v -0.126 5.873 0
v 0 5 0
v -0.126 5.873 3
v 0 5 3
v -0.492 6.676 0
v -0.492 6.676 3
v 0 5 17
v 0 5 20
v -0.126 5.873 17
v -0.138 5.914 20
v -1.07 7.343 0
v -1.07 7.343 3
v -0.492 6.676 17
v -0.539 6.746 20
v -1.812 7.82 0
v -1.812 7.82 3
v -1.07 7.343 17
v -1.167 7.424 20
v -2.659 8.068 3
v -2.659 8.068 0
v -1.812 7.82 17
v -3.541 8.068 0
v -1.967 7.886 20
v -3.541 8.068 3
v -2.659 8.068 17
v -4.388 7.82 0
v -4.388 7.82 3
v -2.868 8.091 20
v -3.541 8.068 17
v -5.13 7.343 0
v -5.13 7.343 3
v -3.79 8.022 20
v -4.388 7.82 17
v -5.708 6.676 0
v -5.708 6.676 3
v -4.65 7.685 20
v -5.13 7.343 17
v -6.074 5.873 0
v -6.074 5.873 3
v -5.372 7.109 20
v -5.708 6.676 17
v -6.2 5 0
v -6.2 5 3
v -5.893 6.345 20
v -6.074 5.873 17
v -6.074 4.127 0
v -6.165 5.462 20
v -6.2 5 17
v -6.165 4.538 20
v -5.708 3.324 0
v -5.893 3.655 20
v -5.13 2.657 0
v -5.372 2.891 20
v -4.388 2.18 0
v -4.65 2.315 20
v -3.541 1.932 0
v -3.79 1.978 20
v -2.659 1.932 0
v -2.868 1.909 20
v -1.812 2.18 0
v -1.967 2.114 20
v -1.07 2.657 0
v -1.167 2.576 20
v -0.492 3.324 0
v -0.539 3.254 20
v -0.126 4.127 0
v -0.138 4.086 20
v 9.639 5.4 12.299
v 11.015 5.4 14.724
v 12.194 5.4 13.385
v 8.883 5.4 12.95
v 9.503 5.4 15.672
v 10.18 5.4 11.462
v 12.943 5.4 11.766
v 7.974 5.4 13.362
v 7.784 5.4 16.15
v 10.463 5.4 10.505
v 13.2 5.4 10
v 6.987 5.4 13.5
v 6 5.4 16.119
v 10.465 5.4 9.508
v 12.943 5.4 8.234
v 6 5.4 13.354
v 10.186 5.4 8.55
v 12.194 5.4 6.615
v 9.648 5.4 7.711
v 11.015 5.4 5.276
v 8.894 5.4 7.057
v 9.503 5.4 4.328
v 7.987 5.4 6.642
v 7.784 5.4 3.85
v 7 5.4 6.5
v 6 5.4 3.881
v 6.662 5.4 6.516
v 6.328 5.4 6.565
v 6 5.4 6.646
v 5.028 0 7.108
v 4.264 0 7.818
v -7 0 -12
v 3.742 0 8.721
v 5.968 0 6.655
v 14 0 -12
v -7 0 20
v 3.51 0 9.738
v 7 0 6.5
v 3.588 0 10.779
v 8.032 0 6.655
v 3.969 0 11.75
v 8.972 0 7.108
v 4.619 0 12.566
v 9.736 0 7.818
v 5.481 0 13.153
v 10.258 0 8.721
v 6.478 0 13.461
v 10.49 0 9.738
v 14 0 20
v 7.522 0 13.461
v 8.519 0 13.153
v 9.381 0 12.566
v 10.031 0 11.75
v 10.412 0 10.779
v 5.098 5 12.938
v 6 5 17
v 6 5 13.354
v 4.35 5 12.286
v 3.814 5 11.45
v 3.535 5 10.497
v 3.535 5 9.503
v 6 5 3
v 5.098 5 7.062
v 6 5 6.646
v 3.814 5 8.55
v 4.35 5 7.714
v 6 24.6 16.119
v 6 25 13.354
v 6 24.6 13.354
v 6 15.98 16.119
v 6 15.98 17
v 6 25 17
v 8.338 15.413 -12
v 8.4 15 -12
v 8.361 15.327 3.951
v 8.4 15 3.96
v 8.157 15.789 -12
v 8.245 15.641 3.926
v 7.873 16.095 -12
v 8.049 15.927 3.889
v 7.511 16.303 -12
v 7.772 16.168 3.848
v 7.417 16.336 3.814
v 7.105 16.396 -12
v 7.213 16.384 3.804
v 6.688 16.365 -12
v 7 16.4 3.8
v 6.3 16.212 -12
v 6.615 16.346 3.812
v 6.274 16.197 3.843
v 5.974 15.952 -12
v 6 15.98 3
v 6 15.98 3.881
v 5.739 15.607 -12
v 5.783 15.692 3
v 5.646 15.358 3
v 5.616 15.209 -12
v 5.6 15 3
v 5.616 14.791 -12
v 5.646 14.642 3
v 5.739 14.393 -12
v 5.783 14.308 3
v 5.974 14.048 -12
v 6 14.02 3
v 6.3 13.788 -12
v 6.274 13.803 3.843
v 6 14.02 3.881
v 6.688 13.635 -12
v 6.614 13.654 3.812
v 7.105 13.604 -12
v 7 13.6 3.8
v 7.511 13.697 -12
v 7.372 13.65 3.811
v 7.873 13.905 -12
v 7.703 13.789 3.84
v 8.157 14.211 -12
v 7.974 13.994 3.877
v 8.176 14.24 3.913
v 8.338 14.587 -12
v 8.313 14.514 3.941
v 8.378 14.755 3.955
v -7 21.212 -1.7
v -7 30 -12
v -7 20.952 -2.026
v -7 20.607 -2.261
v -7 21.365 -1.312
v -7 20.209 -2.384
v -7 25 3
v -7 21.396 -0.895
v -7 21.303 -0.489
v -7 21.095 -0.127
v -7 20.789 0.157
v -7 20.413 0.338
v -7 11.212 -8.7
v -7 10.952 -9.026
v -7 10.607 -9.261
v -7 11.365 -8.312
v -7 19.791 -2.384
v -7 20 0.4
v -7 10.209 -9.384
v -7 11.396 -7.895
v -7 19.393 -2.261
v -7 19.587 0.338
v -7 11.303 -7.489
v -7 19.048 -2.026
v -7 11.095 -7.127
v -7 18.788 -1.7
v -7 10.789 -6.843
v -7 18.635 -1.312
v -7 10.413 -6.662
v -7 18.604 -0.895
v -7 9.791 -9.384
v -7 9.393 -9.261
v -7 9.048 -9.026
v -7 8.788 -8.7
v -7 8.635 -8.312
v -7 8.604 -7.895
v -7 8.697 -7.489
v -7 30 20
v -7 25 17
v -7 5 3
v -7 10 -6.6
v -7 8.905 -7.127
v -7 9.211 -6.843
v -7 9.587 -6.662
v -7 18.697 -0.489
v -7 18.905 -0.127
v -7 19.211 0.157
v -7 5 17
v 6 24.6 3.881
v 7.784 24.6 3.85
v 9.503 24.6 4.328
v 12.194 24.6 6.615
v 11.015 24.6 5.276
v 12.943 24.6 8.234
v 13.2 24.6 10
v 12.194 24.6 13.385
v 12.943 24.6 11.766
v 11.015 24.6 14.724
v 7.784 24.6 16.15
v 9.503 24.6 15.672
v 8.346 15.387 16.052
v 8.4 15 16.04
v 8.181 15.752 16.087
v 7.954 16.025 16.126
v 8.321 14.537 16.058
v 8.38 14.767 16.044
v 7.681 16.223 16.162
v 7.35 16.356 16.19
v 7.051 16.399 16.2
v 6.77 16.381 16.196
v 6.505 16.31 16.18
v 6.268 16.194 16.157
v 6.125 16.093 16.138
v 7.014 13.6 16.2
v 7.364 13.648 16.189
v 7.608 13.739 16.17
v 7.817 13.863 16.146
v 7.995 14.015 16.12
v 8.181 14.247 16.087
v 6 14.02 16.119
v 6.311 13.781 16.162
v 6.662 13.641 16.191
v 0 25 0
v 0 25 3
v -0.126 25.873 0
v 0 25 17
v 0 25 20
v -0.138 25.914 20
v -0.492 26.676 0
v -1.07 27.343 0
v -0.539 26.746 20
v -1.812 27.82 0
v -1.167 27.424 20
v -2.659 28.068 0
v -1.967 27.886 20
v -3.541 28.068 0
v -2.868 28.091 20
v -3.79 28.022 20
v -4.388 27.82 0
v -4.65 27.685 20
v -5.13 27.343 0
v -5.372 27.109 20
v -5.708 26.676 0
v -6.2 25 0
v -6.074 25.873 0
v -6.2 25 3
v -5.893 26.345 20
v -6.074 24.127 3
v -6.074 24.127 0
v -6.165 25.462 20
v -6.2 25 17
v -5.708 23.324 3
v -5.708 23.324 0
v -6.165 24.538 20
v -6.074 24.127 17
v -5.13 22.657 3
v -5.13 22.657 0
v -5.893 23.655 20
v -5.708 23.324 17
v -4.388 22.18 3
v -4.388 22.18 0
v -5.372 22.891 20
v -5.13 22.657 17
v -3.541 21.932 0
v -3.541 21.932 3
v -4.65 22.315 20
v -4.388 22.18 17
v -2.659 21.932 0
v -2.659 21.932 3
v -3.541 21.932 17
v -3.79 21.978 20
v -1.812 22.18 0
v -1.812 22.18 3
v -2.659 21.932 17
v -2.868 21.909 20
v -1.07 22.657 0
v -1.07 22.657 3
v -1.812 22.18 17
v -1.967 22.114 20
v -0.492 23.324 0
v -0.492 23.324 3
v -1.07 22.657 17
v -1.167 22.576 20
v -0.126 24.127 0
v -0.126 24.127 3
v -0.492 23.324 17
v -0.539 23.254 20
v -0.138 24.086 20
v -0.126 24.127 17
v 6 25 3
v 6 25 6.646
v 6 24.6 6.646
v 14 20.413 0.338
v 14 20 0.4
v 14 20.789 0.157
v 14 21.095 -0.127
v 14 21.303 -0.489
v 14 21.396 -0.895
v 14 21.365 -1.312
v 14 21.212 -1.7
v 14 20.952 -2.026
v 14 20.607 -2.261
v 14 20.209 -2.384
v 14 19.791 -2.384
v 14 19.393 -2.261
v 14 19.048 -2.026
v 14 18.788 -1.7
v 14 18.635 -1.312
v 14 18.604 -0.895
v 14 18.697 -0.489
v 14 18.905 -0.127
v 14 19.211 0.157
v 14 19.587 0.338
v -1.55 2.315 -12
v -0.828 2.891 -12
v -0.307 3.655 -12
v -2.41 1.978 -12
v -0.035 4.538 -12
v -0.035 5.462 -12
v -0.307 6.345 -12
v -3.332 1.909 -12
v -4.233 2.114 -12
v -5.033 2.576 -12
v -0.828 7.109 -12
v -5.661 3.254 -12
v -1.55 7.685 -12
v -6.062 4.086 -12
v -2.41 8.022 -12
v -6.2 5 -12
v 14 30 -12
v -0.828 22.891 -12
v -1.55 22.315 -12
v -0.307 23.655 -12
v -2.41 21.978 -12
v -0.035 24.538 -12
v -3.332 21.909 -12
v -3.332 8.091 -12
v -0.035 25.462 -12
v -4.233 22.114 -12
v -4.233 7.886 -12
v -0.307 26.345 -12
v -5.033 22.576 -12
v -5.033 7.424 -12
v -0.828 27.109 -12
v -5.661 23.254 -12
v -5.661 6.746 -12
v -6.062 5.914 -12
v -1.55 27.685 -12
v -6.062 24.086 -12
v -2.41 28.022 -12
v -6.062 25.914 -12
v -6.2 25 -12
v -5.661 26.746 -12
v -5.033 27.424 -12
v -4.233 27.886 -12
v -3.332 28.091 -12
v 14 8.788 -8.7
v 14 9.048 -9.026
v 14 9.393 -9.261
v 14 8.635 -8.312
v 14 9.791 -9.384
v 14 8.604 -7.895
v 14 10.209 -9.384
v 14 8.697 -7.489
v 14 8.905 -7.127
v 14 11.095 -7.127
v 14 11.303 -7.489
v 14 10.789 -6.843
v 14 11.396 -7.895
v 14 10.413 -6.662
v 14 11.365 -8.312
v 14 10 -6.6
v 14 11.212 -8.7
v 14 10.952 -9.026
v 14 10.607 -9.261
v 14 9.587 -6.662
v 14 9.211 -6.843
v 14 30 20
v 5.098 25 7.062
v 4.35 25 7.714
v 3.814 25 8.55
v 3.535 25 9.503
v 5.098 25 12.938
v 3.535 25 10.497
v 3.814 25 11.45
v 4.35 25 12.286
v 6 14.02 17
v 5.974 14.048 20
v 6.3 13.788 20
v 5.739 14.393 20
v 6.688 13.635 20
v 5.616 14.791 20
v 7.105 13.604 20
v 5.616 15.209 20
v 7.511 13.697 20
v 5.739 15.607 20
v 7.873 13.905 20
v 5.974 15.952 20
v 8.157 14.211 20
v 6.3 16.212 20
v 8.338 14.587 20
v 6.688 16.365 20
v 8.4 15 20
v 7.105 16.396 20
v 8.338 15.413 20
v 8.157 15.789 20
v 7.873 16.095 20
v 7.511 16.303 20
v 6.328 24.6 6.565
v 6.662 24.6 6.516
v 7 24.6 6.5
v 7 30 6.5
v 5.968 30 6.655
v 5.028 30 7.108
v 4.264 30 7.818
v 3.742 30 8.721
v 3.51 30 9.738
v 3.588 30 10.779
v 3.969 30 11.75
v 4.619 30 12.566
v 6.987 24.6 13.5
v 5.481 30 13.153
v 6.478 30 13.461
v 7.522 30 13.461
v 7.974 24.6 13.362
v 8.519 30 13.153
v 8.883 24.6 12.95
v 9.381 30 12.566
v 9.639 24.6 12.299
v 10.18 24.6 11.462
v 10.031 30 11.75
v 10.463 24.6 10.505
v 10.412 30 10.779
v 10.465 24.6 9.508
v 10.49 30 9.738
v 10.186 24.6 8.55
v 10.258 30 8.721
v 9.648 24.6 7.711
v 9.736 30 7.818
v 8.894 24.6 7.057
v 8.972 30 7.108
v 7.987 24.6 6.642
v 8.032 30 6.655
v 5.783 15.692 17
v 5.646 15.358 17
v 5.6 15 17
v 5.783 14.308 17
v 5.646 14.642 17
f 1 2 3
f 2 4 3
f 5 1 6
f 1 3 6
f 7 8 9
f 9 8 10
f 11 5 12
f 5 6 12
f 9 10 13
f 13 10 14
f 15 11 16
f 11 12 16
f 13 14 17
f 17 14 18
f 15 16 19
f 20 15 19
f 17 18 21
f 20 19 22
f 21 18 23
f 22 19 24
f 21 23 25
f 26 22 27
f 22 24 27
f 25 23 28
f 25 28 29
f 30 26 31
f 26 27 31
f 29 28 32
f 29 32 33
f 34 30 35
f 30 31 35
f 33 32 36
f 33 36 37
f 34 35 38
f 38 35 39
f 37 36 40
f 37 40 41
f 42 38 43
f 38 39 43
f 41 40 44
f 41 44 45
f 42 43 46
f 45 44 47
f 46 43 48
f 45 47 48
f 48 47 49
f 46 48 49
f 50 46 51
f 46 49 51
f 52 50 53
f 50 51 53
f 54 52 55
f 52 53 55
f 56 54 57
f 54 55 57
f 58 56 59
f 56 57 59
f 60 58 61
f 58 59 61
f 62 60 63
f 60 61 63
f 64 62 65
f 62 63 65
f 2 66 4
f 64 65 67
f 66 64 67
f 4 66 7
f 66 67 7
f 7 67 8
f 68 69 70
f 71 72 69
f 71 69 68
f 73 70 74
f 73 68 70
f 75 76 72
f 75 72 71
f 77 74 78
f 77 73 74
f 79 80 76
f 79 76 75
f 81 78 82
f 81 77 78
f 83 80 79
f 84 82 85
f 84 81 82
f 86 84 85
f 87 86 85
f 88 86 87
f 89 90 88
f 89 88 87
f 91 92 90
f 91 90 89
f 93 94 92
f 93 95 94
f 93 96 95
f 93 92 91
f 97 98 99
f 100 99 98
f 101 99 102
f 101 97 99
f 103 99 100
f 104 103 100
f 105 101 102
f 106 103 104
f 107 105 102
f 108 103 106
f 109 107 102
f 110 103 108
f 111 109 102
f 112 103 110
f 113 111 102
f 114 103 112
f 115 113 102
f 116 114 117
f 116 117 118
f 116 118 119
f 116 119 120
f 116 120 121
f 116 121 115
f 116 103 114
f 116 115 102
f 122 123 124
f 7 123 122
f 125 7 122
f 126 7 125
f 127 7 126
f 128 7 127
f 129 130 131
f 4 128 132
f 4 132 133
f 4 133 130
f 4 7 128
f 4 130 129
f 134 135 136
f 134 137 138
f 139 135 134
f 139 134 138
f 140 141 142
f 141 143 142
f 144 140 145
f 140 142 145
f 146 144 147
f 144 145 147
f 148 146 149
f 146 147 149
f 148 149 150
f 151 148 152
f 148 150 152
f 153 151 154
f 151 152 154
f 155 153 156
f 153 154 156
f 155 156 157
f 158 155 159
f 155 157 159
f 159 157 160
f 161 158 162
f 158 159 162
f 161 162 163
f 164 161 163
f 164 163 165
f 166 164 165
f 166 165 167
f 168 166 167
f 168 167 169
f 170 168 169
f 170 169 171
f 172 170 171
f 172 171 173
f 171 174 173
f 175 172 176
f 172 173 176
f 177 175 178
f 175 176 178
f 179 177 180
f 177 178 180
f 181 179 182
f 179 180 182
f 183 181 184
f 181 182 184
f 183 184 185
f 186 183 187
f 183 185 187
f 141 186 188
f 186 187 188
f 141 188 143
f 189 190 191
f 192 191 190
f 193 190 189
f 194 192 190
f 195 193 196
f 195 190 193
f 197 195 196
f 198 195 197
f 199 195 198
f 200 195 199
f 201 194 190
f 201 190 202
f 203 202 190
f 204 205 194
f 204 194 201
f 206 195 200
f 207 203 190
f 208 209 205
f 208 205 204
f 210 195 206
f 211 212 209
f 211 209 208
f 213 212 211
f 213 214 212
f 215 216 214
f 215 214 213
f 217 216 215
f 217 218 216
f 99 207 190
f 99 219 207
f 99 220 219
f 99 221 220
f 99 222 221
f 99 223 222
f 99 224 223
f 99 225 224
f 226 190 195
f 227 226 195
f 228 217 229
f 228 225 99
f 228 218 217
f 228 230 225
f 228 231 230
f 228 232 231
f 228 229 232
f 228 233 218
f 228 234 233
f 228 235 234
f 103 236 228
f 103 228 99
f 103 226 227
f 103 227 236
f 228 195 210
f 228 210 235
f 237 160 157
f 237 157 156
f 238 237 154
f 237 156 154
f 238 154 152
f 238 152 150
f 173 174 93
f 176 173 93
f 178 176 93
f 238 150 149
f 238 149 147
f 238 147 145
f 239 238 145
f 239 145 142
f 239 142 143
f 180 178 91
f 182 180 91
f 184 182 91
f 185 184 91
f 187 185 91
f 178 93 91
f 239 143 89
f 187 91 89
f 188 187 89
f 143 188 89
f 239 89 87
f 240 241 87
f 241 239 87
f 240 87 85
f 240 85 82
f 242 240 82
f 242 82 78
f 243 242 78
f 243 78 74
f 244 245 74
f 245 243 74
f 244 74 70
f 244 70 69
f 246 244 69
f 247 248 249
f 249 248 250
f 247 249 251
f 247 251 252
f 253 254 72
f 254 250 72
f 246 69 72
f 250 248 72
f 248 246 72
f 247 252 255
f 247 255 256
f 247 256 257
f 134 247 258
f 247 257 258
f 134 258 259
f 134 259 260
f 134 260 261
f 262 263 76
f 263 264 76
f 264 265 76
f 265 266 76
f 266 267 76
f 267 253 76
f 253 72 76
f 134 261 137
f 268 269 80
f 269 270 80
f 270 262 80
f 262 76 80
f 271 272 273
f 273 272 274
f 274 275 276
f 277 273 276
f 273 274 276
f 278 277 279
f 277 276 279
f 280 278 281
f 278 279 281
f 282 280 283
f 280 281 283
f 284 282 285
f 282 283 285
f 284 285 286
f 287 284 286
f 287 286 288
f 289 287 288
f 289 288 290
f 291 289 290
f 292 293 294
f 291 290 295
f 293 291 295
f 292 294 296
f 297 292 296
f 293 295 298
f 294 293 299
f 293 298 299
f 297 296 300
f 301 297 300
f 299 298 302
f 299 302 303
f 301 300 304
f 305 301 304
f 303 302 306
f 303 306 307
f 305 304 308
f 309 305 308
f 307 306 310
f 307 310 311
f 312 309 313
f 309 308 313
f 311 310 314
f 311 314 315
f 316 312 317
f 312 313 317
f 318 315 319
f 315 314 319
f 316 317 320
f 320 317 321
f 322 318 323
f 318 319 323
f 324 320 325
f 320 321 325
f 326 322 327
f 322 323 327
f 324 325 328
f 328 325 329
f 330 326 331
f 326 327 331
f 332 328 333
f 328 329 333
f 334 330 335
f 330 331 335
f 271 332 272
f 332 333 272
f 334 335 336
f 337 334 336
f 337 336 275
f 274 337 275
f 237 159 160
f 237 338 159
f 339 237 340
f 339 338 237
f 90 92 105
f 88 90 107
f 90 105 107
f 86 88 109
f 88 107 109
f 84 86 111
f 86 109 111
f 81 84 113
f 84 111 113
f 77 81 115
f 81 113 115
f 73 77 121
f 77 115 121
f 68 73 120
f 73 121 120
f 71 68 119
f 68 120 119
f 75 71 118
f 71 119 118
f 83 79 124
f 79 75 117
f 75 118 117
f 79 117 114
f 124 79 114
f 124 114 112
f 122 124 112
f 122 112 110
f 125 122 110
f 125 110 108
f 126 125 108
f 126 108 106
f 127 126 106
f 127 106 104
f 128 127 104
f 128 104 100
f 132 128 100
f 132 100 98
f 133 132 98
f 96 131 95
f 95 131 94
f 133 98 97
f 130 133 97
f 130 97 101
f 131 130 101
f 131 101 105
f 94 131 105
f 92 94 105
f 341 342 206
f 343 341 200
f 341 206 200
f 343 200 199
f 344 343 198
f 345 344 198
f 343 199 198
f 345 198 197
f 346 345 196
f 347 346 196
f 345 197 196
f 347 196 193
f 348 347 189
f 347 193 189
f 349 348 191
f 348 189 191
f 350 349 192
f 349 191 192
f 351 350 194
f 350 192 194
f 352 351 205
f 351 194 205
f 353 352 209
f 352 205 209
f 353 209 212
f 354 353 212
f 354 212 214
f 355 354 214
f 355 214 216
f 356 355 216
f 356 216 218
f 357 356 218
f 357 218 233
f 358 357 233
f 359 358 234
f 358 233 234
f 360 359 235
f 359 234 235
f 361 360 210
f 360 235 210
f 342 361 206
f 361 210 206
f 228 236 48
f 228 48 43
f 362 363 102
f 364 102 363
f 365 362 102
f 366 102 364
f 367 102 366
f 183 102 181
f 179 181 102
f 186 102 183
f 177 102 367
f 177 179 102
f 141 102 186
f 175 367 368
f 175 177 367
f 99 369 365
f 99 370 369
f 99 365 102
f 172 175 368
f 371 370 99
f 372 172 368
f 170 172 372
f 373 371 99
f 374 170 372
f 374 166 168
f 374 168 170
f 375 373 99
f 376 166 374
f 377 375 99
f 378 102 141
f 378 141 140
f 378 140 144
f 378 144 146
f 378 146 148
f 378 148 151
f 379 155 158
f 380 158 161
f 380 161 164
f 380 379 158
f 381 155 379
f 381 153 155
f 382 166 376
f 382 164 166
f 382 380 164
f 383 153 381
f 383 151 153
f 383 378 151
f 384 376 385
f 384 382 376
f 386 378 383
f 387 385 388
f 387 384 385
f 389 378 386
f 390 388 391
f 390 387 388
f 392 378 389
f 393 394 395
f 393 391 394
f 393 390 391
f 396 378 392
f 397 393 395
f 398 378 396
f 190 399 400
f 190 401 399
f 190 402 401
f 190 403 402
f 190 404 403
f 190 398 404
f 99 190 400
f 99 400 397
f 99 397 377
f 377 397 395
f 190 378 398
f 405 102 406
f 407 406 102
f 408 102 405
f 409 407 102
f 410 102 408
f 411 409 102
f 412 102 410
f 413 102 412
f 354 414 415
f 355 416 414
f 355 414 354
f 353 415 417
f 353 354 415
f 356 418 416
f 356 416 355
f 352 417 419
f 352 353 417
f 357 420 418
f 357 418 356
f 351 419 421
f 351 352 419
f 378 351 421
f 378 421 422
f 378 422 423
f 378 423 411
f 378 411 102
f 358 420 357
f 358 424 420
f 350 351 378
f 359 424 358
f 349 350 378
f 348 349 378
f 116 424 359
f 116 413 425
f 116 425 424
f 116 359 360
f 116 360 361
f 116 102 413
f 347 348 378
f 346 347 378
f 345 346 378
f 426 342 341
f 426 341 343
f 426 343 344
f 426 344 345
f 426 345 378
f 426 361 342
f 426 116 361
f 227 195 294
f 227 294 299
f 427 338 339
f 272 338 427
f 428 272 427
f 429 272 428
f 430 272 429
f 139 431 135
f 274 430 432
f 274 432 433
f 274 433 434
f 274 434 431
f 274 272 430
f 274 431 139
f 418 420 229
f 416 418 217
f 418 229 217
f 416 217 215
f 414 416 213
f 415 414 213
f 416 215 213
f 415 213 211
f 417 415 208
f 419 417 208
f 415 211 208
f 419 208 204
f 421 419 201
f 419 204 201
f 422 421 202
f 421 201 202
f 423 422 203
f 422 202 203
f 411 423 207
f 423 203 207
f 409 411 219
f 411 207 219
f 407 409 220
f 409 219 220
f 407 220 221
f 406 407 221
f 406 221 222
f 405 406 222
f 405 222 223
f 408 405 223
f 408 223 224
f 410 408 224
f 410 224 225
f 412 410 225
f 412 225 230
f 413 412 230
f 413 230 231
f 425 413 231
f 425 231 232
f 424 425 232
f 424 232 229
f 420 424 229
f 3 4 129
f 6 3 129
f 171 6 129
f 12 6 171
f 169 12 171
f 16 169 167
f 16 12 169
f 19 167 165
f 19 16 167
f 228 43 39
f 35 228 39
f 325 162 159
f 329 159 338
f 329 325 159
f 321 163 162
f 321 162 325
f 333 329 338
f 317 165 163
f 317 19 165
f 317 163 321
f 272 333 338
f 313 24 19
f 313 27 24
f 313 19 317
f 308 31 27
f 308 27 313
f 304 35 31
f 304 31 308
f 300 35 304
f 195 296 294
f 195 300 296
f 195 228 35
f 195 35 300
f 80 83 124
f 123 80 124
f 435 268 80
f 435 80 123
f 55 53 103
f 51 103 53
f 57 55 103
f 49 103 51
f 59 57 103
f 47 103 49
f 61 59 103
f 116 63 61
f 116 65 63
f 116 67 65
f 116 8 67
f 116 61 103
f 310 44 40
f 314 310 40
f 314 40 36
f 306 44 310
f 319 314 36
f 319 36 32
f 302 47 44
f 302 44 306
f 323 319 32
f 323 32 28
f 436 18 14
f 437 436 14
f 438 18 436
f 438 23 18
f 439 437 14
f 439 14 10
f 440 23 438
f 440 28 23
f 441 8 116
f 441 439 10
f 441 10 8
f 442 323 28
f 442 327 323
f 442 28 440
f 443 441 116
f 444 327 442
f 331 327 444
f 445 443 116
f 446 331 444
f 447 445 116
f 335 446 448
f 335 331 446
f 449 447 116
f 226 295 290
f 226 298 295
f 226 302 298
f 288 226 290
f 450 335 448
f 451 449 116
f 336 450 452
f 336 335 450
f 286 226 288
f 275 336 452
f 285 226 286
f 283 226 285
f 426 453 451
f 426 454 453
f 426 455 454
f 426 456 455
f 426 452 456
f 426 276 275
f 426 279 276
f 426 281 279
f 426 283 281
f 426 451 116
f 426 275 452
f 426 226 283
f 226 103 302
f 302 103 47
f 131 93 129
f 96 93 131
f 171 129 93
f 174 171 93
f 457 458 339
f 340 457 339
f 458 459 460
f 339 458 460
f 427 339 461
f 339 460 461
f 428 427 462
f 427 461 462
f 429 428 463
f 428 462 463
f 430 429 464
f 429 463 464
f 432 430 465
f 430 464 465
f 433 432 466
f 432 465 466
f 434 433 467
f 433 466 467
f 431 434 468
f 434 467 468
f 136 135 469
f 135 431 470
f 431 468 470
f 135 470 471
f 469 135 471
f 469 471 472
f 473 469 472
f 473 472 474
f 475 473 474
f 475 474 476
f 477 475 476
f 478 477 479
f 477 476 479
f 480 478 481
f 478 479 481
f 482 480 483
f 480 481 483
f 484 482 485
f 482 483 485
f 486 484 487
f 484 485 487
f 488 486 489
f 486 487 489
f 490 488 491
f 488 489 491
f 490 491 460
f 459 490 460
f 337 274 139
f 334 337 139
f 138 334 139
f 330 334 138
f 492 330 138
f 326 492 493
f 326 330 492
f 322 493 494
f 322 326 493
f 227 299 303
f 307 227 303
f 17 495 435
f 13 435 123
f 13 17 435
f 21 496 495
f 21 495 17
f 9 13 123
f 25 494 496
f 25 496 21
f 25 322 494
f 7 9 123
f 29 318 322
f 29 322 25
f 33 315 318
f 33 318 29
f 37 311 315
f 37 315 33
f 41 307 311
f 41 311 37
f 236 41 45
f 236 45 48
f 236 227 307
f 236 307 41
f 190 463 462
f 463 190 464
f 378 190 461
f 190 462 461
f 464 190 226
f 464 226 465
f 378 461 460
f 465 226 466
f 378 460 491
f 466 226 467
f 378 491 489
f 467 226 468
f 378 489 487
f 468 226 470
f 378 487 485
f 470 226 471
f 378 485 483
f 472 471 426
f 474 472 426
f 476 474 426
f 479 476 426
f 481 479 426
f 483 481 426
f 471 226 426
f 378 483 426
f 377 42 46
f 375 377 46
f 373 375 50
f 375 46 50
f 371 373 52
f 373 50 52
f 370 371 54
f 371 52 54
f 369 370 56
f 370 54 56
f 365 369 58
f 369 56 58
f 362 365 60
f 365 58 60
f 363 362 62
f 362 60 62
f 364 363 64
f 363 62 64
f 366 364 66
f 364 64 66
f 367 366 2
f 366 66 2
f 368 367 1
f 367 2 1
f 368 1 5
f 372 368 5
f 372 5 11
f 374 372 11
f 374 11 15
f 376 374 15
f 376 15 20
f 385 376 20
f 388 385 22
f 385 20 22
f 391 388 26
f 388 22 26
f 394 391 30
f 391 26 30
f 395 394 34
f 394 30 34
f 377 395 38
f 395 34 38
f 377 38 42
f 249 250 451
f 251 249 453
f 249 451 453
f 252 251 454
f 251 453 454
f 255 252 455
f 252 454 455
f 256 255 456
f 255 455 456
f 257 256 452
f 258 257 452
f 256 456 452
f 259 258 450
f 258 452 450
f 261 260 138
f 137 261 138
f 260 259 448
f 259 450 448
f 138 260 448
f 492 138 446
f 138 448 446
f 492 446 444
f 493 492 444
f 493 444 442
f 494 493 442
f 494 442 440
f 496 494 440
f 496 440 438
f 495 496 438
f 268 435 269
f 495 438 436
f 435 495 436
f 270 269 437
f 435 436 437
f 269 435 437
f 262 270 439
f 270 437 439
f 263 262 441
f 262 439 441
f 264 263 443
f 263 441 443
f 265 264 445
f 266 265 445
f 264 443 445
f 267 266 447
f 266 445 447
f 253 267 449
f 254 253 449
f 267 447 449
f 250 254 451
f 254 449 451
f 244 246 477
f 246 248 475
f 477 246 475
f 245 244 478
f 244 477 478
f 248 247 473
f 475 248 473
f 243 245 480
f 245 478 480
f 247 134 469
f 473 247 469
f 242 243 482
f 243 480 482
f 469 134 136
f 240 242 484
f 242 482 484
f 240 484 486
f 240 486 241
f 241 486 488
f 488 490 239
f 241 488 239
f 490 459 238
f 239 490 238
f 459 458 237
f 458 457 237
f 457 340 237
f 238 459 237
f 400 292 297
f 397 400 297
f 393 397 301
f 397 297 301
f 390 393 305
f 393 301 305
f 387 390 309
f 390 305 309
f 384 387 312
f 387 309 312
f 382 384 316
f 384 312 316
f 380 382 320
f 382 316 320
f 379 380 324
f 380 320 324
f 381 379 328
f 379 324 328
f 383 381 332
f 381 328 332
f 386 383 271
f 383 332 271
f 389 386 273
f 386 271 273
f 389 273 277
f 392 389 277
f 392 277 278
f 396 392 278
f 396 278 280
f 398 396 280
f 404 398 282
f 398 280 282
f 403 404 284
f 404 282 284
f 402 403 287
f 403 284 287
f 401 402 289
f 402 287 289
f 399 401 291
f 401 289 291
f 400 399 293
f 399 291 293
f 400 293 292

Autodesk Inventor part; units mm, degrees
ref_plane "YZ Plane" through (0, 0, 0) normal (1, 0, 0) x (0, 1, 0)
ref_plane "XZ Plane" through (0, 0, 0) normal (0, 1, 0) x (-1, 0, 0)
sketch "Sketch1" plane through (0, 0, 0) normal (1, 0, 0) x (0, 1, 0)
  line L0 (0, 0) -> (30, 0)
  line L1 (30, 0) -> (30, 20)
  line L2 (30, 20) -> (0, 20)
  line L3 (0, 20) -> (0, 0)
  dimension "d0" = 30
  dimension "d1" = 20
extrude "Extrusion1" add sketch "Sketch1" along normal blind 14
ref_plane "Work Plane1" through (7, 0, 0) normal (-1, 0, 0) x (0, 0, 1)
sketch "Sketch2" plane through (7, 0, 0) normal (-1, 0, 0) x (0, 0, 1)
  line L0 (20, 0) -> (0, 0) projected
  line L1 (10, 0) -> (10, 30)
  line L2 (0, 30) -> (20, 30) projected
  line L3 (3.8, 5.4) -> (16.2, 5.4)
  line L4 (16.2, 5.4) -> (16.2, 24.6)
  line L5 (16.2, 24.6) -> (3.8, 24.6)
  line L6 (3.8, 24.6) -> (3.8, 5.4)
  line L7 (3.8, 5.4) -> (16.2, 24.6) construction
  line L8 (16.2, 5.4) -> (3.8, 24.6) construction
  line L9 (10, 5.4) -> (6.5, 5.4)
  line L10 (6.5, 5.4) -> (6.5, 0)
  line L11 (6.5, 0) -> (10, 0)
  line L12 (10, 0) -> (10, 5.4)
  line L13 (10, 24.6) -> (6.5, 24.6)
  line L14 (6.5, 24.6) -> (6.5, 30)
  line L15 (6.5, 30) -> (10, 30)
  line L16 (10, 30) -> (10, 24.6)
  line L17 (10, 24.6) -> (3.8, 24.6)
  line L18 (3.8, 24.6) -> (3.8, 5.4)
  line L19 (3.8, 5.4) -> (10, 5.4)
  line L20 (10, 5.4) -> (10, 24.6)
  point P0 (10, 15)
  dimension "d5" = 12.4
  dimension "d6" = 19.2
  dimension "d7" = 3.5
revolve "Revolution1" cut sketch "Sketch2" angle 360 about axis through (7, 0, 10) along (0, 1, 0) contours L0 L10 L3 L1 | L3 L6 L5 L1 | L5 L14 L2 L1
sketch "Sketch3" plane through (0, 0, 20) normal (0, 0, 1) x (1, 0, 0)
  line L0 (0, 30) -> (0, 0) projected
  line L1 (0, 0) -> (14, 0) projected
  line L2 (14, 30) -> (14, 0) projected
  line L3 (0, 30) -> (14, 30) projected
  line L4 (0, 0) -> (0, 30) projected
  line L5 (0, 0) -> (-7, 0)
  line L6 (-7, 0) -> (-7, 30)
  line L7 (-7, 30) -> (0, 30)
  line L8 (0, 30) -> (0, 0)
  line L9 (0, 30) -> (14, 30) projected
  circle A0 centre (-3.1, 5) radius 3.1
  line L10 (0, 30) -> (0, 0) projected
  circle A1 centre (-3.1, 25) radius 3.1
  dimension "d9" = 7
  dimension "d10" = 6.2
  dimension "d11" = 6.2
  dimension "d12" = 5
  dimension "d13" = 5
extrude "Extrusion2" add sketch "Sketch3" against normal up to surface (20 mm away) contours L0 L5 L6 L7
sketch "Sketch4" plane through (-7, 0, 20) normal (-1, 0, 0) x (0, 0, 1)
  line L0 (-16.2, 24.6) -> (-16.2, 5.4) projected
  line L1 (-15, 24.5) -> (-5, 24.5) projected
  line L2 (-13.5, 24.6) -> (-6.5, 24.6) projected
  line L3 (-16.2, 5.4) -> (-3.8, 5.4) projected
  line L4 (-3.8, 24.6) -> (-3.8, 5.4) projected
  line L5 (-16.2, 24.6) -> (-3.8, 24.6) projected
  line L6 (-17, 25) -> (-3, 25)
  line L7 (-3, 25) -> (-3, 5)
  line L8 (-3, 5) -> (-17, 5)
  line L9 (-17, 5) -> (-17, 25)
  line L10 (-17, 25) -> (-3, 5) construction
  line L11 (-3, 25) -> (-17, 5) construction
  line L12 (-13.5, 30.2686) -> (-6.5, 30.2686)
  line L13 (-6.5, 30.2686) -> (-6.5, 25)
  line L14 (-6.5, 25) -> (-13.5, 25)
  line L15 (-13.5, 25) -> (-13.5, 30.2686)
  line L16 (-13.5, 30.2686) -> (-6.5, 25) construction
  line L17 (-6.5, 30.2686) -> (-13.5, 25) construction
  line L18 (-13.5, -0.71) -> (-6.5, -0.71)
  line L19 (-6.5, -0.71) -> (-6.5, 5)
  line L20 (-6.5, 5) -> (-13.5, 5)
  line L21 (-13.5, 5) -> (-13.5, -0.71)
  line L22 (-13.5, -0.71) -> (-6.5, 5) construction
  line L23 (-6.5, -0.71) -> (-13.5, 5) construction
  point P0 (-20, 0)
  point P1 (-10, 15)
  point P2 (-10, 27.6343)
  point P3 (-10, 2.145)
  dimension "d16" = 14
  dimension "d17" = 20
  dimension "d18" = 7
extrude "Extrusion3" cut sketch "Sketch4" against normal blind 13 contours L5 L2 L4 L3 L0 | L6 L7 L8 L9
sketch "Sketch5" plane through (14, 0, 0) normal (0, 0, -1) x (-1, 0, 0)
  line L0 (21, 30) -> (0, 30) projected
  line L1 (0, 0) -> (0, 30) projected
  line L2 (21, 0) -> (0, 0) projected
  line L3 (21, 30) -> (21, 0) projected
  circle A0 centre (17.1, 25) radius 3.1 projected
  circle A1 centre (17.1, 5) radius 3.1 projected
  point P0 (14, 0)
ref_plane "Work Plane2" through (-3.5, -134.0004, -5) normal (0, 0, -1) x (0, 1, 0)
extrude "Extrusion4" add sketch "Sketch5" along normal blind 12
sketch "Sketch6" plane through (-7, 0, 20) normal (-1, 0, 0) x (0, 0, 1)
  point P0 (-20, 0)
sketch "Sketch7" plane through (-7, 0, 20) normal (-1, 0, 0) x (0, 0, 1)
  line L0 (-3, 5) -> (-17, 5) projected
  line L1 (-17, 5) -> (-17, 25) projected
  line L2 (-17, 25) -> (-3, 25) projected
  line L3 (-3, 25) -> (-3, 5) projected
  line L4 (0, 0) -> (-32, 0) projected
  line L5 (0, 30) -> (0, 0) projected
  line L6 (0, 30) -> (-32, 30) projected
  line L7 (-32, 0) -> (-32, 30) projected
  circle A0 centre (-28, 10) radius 1.4
  circle A1 centre (-21, 20) radius 1.4
  point P0 (-20, 0)
  dimension "d23" = 2.8
  dimension "d24" = 2.8
  dimension "d25" = 10
  dimension "d26" = 10
  dimension "d27" = 4
  dimension "d28" = 4
extrude "Extrusion5" cut sketch "Sketch7" against normal through all contours A0 | A1
sketch "Sketch8" plane through (14, 0, 20) normal (0, 0, 1) x (1, 0, 0)
  line L0 (-10, 99.8613) -> (-10, -100.1387)
  line L1 (-4, 99.8613) -> (-4, -100.1387)
  circle A0 centre (-7, 15) radius 1.4
  line L2 (-21, 0) -> (0, 0) projected
  point P0 (-14, 0)
  dimension "d31" = 2.8
  dimension "d32" = 15
  dimension "d33" = 3
extrude "Extrusion6" cut sketch "Sketch8" against normal through all
properties part number "30_CUBE_openXY_slider"
